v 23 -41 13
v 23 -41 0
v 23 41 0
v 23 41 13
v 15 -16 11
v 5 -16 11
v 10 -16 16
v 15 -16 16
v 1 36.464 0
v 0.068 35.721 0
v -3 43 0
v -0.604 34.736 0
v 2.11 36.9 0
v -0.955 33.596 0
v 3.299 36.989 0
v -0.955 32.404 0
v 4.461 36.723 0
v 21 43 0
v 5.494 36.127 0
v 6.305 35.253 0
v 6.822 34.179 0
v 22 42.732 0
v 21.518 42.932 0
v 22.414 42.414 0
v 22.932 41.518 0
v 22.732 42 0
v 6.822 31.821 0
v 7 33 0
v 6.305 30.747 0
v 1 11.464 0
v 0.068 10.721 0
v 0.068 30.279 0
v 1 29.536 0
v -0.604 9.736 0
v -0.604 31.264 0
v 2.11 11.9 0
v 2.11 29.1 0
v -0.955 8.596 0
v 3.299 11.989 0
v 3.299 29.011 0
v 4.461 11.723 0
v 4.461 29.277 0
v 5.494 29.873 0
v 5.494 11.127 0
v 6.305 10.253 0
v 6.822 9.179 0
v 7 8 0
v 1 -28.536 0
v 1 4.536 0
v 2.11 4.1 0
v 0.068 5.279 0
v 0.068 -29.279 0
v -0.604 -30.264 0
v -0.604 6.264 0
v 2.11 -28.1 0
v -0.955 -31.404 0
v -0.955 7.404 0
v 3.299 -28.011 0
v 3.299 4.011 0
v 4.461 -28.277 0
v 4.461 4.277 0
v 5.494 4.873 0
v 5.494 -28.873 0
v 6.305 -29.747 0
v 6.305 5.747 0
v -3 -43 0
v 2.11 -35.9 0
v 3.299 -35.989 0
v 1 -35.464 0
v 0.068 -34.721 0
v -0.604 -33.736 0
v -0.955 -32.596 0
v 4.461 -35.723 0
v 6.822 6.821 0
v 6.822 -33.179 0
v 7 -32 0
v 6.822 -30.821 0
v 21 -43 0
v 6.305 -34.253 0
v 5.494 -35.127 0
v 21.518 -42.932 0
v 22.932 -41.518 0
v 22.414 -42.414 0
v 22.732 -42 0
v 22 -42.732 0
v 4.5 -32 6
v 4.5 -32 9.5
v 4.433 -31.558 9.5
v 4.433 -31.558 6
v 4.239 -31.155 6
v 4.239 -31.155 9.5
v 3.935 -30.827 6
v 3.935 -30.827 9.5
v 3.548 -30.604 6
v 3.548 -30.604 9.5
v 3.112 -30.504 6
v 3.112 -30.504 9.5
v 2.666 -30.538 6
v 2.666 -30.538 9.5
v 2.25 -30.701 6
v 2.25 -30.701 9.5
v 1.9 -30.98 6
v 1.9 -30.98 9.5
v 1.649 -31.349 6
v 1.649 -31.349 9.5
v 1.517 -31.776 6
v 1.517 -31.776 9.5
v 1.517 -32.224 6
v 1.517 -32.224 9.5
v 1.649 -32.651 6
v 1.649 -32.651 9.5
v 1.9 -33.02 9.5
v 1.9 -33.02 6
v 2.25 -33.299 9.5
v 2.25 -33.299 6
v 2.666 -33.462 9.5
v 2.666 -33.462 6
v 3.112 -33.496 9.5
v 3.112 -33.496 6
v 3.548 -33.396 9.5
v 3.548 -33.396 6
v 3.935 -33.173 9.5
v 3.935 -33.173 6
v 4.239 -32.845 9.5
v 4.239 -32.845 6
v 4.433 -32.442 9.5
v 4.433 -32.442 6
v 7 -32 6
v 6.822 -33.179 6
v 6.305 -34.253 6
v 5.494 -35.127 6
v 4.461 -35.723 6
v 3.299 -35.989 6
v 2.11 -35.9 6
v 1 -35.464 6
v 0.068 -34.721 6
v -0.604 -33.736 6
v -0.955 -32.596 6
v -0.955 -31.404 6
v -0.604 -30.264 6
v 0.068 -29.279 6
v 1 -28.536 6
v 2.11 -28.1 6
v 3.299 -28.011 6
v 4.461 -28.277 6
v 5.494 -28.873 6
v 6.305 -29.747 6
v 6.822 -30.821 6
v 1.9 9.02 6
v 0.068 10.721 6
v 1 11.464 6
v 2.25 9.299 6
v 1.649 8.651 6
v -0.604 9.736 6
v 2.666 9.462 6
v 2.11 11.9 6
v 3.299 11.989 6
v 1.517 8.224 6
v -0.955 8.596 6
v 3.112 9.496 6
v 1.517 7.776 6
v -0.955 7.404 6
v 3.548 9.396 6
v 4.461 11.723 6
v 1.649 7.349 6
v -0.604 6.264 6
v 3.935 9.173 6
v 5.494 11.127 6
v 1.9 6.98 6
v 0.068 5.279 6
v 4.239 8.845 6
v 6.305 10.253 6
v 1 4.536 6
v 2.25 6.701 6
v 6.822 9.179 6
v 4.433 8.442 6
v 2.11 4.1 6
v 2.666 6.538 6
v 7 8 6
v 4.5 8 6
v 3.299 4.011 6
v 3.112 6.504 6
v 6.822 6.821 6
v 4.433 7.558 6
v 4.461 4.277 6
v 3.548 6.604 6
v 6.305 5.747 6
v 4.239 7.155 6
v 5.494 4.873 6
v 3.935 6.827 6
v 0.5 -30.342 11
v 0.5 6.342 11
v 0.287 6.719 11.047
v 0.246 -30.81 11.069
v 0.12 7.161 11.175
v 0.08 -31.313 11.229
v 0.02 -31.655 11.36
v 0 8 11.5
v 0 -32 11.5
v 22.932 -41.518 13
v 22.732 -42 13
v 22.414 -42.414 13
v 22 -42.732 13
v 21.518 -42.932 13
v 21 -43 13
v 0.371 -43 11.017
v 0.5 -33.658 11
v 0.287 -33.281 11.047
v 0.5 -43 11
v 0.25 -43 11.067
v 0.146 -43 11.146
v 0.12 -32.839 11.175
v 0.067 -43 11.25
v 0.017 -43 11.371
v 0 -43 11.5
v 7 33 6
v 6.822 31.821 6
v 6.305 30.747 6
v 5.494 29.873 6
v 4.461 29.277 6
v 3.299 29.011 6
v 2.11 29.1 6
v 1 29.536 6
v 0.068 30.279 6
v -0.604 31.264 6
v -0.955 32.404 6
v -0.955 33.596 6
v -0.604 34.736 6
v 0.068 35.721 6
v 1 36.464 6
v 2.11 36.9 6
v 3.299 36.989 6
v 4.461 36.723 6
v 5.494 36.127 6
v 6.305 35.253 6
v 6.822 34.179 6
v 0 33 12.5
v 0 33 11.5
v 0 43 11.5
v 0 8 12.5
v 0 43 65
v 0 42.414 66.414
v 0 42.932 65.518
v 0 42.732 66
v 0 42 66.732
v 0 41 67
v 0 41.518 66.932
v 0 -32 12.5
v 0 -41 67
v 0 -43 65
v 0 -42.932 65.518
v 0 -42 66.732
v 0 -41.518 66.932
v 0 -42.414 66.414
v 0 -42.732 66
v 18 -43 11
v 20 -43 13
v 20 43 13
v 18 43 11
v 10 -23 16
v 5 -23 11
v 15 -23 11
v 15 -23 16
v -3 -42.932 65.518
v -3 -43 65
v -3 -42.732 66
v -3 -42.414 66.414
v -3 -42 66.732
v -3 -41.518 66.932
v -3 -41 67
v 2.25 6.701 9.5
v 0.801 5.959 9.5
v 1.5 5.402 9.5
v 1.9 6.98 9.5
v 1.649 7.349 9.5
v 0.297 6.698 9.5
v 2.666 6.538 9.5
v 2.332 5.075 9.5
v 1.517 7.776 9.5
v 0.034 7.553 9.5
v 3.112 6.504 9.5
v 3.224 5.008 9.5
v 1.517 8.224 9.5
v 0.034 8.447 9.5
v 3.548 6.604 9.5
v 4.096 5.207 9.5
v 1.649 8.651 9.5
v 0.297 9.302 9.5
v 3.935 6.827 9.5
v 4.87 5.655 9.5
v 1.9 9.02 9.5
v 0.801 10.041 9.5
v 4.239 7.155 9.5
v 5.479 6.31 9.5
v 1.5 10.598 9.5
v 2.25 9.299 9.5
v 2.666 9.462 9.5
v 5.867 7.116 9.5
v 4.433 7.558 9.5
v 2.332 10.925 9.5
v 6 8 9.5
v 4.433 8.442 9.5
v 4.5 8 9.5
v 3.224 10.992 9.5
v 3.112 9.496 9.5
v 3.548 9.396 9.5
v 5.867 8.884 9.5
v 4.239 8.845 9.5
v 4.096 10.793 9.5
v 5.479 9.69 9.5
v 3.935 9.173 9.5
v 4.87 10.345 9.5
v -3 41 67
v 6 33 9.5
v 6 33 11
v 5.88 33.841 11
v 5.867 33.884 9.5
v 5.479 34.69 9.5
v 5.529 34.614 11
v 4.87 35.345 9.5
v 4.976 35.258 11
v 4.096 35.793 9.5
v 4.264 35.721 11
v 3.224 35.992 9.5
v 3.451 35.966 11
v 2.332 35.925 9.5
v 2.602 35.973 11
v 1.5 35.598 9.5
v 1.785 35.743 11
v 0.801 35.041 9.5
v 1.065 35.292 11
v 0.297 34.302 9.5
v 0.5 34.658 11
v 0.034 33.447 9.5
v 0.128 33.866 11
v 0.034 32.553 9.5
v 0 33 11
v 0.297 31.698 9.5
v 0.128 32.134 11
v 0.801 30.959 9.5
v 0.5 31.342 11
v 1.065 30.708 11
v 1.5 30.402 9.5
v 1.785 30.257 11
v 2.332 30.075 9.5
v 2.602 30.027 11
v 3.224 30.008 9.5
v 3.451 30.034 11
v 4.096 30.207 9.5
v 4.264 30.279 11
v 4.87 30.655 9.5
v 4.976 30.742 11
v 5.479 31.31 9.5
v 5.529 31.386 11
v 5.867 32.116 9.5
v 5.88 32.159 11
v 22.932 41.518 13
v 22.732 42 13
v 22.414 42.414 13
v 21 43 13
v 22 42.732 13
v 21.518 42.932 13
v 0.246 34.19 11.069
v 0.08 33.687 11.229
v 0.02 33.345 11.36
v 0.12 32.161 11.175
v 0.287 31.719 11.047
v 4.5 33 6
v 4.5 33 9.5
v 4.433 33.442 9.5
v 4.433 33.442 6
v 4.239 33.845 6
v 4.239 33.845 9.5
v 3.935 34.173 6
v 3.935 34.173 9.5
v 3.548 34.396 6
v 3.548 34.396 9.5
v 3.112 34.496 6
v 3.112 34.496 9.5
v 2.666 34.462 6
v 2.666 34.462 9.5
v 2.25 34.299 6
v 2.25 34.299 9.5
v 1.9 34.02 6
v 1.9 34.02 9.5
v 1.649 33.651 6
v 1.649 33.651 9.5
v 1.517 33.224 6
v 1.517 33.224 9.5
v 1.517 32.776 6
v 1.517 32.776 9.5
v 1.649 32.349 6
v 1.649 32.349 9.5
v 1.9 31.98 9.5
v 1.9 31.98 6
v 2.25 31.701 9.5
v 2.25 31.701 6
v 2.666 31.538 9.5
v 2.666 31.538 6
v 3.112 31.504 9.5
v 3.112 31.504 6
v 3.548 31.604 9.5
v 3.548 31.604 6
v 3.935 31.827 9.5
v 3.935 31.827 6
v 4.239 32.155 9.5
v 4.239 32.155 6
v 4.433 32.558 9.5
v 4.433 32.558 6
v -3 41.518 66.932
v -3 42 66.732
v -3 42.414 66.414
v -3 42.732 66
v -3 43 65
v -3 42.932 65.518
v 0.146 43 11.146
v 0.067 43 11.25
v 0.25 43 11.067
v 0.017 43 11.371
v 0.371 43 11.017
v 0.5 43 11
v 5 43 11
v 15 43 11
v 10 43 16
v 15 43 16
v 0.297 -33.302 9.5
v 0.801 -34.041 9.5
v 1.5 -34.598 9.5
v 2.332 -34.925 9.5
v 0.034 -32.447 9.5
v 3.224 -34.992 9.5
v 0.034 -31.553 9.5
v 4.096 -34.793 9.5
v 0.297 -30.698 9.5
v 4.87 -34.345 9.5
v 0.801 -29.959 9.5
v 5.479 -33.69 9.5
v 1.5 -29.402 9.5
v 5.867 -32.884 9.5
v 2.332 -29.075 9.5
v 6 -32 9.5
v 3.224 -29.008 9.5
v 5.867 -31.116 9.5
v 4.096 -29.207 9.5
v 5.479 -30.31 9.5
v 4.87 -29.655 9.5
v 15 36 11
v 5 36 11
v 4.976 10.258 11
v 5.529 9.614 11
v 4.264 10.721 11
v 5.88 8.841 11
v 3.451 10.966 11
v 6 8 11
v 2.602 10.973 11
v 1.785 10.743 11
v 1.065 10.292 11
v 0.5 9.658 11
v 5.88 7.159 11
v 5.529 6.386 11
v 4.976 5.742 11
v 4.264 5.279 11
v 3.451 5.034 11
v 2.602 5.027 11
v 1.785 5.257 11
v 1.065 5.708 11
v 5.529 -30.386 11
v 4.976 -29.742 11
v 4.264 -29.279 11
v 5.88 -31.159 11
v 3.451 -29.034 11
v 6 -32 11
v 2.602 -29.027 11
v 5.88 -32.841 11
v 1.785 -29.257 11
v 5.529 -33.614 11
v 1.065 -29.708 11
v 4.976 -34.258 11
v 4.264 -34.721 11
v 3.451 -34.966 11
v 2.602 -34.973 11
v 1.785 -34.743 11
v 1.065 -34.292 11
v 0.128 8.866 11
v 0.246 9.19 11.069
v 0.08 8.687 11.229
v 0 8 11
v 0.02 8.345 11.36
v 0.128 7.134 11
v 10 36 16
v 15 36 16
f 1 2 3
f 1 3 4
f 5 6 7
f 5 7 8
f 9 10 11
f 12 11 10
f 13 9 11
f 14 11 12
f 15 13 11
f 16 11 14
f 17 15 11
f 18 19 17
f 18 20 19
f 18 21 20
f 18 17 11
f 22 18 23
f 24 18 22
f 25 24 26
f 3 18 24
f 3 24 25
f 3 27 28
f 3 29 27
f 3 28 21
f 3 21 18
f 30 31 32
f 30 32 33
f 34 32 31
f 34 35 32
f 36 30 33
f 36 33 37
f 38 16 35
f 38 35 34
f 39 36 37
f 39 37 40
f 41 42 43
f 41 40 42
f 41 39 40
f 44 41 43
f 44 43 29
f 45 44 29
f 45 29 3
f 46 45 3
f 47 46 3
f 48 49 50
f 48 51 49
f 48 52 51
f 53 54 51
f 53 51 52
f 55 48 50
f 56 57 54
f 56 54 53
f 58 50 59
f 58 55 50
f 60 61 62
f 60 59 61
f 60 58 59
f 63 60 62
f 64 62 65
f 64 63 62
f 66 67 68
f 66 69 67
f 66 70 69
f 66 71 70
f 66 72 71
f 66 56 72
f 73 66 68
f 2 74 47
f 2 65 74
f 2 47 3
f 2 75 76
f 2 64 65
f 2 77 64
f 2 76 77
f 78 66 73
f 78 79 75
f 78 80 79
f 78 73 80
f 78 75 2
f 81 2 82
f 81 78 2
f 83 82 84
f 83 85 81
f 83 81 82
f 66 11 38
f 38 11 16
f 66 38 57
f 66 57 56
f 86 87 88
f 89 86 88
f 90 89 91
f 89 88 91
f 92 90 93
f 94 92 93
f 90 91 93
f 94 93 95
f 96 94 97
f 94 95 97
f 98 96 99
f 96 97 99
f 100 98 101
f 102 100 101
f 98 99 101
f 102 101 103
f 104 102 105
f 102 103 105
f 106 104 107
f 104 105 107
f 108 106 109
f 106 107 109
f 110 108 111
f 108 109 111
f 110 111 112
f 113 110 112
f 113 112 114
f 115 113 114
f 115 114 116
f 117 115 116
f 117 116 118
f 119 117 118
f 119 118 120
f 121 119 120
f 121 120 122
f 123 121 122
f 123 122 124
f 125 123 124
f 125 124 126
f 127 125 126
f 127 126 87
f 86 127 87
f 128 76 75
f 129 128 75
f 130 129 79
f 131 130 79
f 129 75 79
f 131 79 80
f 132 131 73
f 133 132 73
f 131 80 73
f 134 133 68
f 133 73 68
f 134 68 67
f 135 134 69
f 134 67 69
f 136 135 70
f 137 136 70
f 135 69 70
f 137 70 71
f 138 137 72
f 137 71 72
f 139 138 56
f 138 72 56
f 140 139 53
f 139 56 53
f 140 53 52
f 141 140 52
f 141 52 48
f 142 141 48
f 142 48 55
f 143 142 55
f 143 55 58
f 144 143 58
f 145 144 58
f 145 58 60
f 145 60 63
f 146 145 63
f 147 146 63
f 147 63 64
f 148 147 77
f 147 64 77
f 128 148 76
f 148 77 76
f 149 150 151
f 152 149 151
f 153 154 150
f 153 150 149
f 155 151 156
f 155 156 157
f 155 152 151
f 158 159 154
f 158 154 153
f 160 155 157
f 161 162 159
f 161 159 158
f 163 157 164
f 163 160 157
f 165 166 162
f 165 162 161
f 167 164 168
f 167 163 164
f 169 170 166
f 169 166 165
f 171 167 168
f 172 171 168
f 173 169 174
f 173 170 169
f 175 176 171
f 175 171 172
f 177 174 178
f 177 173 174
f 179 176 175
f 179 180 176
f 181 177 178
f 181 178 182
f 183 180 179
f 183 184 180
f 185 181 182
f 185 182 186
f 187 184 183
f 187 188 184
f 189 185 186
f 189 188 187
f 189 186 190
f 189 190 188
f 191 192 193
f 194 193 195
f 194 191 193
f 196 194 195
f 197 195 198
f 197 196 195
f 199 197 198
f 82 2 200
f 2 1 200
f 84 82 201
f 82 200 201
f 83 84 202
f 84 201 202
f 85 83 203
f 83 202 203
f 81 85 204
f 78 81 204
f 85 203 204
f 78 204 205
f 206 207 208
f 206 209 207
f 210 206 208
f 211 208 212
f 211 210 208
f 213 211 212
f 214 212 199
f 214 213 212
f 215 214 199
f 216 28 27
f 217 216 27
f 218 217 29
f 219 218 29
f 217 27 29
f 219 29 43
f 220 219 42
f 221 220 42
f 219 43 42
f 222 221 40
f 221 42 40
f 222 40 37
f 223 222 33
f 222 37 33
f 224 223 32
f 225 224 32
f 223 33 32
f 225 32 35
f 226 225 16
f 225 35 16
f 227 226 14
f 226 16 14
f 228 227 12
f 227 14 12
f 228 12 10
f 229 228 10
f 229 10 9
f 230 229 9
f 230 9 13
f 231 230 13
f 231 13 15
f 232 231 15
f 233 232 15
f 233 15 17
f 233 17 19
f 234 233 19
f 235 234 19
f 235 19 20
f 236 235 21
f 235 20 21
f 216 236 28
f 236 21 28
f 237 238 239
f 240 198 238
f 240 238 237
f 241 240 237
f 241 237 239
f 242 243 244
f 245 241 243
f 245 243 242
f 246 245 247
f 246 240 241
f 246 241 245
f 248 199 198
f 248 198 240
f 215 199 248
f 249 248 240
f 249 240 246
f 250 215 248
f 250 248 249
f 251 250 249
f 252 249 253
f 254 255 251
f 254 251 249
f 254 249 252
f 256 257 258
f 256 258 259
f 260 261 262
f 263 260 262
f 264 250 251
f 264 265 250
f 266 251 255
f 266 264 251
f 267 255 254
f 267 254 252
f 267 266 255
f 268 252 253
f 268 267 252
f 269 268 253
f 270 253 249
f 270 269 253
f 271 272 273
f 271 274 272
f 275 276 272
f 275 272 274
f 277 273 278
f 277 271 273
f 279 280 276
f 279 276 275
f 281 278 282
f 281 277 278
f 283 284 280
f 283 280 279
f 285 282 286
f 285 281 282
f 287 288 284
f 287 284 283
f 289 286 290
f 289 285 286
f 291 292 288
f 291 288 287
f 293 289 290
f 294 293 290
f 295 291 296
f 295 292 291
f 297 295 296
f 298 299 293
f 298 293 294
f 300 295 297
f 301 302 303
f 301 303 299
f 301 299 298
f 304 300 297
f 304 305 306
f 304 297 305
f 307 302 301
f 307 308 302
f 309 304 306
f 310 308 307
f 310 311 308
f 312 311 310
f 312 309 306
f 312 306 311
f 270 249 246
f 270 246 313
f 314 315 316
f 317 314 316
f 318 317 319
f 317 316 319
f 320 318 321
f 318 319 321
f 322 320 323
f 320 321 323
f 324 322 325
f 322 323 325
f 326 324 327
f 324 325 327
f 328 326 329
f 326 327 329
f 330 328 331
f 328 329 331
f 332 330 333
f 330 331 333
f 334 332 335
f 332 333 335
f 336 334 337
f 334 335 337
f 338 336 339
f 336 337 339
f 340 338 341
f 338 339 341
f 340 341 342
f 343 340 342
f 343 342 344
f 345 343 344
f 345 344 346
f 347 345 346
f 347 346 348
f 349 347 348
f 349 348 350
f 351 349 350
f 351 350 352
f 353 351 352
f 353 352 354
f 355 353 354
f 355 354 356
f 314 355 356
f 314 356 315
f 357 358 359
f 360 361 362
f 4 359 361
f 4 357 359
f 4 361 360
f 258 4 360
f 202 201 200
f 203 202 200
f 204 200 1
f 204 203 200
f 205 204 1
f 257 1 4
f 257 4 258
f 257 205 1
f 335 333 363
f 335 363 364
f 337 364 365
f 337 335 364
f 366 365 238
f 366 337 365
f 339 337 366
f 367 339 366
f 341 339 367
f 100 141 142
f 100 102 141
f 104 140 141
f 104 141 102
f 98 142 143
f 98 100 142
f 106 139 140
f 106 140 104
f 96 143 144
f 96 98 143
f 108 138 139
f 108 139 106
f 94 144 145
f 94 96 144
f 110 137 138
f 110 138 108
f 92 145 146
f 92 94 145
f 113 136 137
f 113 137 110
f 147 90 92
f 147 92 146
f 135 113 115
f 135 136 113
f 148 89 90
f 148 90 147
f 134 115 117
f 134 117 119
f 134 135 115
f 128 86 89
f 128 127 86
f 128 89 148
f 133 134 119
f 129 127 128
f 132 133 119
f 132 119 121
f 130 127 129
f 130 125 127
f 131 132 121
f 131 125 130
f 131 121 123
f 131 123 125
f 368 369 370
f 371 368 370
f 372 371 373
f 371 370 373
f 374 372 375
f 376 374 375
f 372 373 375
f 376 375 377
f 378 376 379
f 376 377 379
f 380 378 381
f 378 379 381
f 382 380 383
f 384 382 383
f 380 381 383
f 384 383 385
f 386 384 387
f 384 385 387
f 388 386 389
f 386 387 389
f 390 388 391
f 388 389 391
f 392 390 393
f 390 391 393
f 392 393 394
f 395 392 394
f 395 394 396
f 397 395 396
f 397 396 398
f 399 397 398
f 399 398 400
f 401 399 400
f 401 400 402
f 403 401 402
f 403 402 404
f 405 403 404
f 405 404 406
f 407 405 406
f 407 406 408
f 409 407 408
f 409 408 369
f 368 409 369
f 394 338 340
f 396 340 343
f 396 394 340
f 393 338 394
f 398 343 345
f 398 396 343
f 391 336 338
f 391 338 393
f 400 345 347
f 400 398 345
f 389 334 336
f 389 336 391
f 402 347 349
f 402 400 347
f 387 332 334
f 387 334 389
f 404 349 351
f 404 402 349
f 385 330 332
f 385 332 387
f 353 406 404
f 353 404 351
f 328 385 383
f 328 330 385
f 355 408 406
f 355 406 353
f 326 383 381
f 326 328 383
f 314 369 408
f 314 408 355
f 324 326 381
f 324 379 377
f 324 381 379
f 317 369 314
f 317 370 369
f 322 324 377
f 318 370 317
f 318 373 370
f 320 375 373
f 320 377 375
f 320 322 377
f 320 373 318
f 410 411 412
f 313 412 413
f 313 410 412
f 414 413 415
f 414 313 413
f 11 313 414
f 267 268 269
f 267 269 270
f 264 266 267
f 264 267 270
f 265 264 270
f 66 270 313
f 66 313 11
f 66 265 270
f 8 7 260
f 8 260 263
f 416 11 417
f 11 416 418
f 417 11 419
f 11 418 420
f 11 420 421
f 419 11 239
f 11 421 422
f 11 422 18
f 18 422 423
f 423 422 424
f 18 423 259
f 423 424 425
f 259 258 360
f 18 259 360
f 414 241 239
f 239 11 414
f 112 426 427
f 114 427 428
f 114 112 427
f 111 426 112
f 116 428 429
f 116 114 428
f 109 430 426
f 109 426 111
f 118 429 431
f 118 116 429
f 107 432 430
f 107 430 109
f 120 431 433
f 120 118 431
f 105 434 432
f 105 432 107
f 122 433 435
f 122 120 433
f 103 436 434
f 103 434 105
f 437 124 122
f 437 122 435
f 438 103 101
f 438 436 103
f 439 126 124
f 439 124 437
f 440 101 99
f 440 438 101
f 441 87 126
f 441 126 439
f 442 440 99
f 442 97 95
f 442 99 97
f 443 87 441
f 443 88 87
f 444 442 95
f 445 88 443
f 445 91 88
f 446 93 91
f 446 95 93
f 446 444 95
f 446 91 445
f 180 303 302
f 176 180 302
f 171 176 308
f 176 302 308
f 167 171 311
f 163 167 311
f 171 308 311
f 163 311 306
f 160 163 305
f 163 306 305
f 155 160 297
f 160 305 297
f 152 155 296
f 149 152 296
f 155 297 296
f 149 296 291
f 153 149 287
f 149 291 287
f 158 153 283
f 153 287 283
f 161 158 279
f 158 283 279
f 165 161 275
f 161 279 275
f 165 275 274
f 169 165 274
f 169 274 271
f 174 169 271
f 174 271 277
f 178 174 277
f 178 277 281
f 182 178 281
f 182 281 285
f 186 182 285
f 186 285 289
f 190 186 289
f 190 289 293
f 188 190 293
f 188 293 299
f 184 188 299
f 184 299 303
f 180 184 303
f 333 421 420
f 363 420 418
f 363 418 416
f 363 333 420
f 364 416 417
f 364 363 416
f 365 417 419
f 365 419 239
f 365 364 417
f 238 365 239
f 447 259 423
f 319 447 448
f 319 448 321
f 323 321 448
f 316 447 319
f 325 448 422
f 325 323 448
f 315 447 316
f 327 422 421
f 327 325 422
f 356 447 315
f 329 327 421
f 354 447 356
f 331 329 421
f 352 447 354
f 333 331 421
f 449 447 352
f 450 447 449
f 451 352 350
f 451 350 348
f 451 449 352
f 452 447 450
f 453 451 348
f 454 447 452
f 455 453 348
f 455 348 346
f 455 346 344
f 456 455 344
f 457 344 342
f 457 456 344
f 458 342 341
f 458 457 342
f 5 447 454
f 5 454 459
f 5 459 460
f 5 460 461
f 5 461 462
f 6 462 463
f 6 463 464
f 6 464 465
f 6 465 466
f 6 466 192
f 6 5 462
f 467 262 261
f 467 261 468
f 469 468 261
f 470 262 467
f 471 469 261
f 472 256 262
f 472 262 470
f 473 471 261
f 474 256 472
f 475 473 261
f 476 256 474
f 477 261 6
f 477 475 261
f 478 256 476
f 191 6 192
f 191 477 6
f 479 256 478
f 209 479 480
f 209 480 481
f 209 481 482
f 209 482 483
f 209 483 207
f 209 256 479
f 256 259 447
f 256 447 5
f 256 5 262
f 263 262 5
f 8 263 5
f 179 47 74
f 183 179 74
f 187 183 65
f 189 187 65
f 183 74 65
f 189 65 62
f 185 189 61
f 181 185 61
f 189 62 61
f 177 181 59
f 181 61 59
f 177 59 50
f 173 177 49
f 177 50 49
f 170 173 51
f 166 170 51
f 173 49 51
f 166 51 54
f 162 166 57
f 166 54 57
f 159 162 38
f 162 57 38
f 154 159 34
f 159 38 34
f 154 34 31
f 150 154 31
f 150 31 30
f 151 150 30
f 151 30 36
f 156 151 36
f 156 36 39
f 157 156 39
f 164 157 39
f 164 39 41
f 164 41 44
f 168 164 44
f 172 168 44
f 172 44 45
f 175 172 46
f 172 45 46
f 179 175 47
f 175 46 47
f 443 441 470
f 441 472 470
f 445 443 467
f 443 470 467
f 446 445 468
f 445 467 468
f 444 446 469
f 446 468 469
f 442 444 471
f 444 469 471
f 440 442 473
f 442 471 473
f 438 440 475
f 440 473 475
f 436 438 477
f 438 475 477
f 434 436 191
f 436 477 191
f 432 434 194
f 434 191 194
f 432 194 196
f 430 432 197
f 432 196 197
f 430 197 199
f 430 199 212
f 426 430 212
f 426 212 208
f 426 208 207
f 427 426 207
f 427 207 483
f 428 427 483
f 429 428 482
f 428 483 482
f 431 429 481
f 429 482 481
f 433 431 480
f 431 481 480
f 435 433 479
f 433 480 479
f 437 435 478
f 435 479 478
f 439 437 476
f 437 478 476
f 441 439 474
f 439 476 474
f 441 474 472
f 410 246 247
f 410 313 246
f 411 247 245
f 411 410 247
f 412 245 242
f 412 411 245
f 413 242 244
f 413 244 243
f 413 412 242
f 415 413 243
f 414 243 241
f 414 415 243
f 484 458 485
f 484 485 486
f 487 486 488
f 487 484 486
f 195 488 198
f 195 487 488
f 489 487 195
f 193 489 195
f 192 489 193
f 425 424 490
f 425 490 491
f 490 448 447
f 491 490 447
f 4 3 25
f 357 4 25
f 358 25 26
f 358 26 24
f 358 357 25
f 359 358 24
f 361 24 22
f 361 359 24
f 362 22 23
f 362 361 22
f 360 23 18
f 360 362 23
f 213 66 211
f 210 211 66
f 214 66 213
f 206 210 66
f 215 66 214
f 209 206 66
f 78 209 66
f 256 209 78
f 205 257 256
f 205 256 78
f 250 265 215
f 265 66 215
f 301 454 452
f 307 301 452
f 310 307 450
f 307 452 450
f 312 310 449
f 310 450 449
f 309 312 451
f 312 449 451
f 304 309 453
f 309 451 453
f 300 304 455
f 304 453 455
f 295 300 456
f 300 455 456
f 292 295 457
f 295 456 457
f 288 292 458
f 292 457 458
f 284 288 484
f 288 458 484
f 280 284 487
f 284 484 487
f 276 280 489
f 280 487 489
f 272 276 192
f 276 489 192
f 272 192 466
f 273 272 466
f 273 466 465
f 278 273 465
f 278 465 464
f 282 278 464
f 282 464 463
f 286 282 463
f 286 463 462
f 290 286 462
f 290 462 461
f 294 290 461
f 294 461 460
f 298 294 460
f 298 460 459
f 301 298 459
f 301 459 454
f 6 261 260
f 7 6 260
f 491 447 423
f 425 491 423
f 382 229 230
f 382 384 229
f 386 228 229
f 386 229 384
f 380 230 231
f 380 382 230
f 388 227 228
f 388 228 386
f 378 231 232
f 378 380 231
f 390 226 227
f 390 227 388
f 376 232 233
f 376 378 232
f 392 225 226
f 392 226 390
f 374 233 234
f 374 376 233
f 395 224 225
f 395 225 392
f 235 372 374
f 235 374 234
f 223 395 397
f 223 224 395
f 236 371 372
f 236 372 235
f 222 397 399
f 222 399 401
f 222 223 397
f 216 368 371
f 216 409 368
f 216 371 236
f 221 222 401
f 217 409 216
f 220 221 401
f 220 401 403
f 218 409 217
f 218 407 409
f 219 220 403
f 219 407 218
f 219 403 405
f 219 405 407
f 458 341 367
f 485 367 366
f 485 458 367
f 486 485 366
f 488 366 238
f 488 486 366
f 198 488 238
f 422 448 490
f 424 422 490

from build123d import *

# Parameters (mm, degrees)
F1_DEPTH  = 43
F2_R      = 4
F3_DEPTH  = 6
F4_R      = 1.5
F5_DEPTH  = 25
F4_R_2    = 3
F6_DEPTH  = 1.5
F7_W      = 10
F7_H      = 7
F8_DEPTH  = 5
F10_DEPTH = 50
F11_R     = 2


with BuildPart() as f1:
    # F0 (on Front) → F1 (new body, symmetric)
    with BuildSketch(Plane.XZ):
        with BuildLine():
            Line((0, 11.5), (0, 67))
            Line((0, 67), (-3, 67))
            Line((-3, 67), (-3, 0))
            Line((-3, 0), (23, 0))
            Line((23, 0), (23, 13))
            Line((23, 13), (20, 13))
            Line((20, 13), (18, 11))
            Line((18, 11), (0.5, 11))
            ThreePointArc((0.5, 11), (0.146447, 11.146447), (0, 11.5))
        make_face()
    extrude(amount=F1_DEPTH, both=True)

    # F2 (on face) → F3 (cut)
    with BuildSketch(Plane(origin=(0, 0, 0), x_dir=(1, 0, 0), z_dir=(0, 0, -1))):
        with Locations((3, -33)):
            Circle(F2_R)
        with Locations((3, -8)):
            Circle(F2_R)
        with Locations((3, 32)):
            Circle(F2_R)
    extrude(amount=-F3_DEPTH, mode=Mode.SUBTRACT)

    # F4 (on face) → F5 (cut)
    with BuildSketch(Plane.XY.offset(11)):
        with Locations((3, 33)):
            Circle(F4_R)
        with Locations((3, 8)):
            Circle(F4_R)
        with Locations((3, -32)):
            Circle(F4_R)
    extrude(amount=-F5_DEPTH, mode=Mode.SUBTRACT)

    # F4 (on face) → F6 (cut, symmetric)
    with BuildSketch(Plane.XY.offset(11)):
        with Locations((3, 8)):
            Circle(F4_R_2)
        with Locations((3, 8)):
            Circle(F4_R, mode=Mode.SUBTRACT)
        with Locations((3, 33)):
            Circle(F4_R_2)
        with Locations((3, 33)):
            Circle(F4_R, mode=Mode.SUBTRACT)
        with Locations((3, -32)):
            Circle(F4_R_2)
        with Locations((3, -32)):
            Circle(F4_R, mode=Mode.SUBTRACT)
    extrude(amount=F6_DEPTH, both=True, mode=Mode.SUBTRACT)

    # F7 (on face) → F8 (join)
    with BuildSketch(Plane.XY.offset(11)):
        with Locations((10, 39.5)):
            Rectangle(F7_W, F7_H)
        with Locations((10, -19.5)):
            Rectangle(F7_W, F7_H)
    extrude(amount=F8_DEPTH)

    # F9 (on Front) → F10 (cut, symmetric)
    with BuildSketch(Plane.XZ):
        Polygon((5, 19), (5, 11), (13, 19), align=None)
    extrude(amount=F10_DEPTH, both=True, mode=Mode.SUBTRACT)

    # F11
    f11_edges = [f1.edges().sort_by_distance(p)[0] for p in [
        (23, -43, 6.5),
        (23, 43, 6.5),
        (-1.5, -43, 67),
        (-1.5, 43, 67),
    ]]
    fillet(f11_edges, radius=F11_R)


solid = f1.part
